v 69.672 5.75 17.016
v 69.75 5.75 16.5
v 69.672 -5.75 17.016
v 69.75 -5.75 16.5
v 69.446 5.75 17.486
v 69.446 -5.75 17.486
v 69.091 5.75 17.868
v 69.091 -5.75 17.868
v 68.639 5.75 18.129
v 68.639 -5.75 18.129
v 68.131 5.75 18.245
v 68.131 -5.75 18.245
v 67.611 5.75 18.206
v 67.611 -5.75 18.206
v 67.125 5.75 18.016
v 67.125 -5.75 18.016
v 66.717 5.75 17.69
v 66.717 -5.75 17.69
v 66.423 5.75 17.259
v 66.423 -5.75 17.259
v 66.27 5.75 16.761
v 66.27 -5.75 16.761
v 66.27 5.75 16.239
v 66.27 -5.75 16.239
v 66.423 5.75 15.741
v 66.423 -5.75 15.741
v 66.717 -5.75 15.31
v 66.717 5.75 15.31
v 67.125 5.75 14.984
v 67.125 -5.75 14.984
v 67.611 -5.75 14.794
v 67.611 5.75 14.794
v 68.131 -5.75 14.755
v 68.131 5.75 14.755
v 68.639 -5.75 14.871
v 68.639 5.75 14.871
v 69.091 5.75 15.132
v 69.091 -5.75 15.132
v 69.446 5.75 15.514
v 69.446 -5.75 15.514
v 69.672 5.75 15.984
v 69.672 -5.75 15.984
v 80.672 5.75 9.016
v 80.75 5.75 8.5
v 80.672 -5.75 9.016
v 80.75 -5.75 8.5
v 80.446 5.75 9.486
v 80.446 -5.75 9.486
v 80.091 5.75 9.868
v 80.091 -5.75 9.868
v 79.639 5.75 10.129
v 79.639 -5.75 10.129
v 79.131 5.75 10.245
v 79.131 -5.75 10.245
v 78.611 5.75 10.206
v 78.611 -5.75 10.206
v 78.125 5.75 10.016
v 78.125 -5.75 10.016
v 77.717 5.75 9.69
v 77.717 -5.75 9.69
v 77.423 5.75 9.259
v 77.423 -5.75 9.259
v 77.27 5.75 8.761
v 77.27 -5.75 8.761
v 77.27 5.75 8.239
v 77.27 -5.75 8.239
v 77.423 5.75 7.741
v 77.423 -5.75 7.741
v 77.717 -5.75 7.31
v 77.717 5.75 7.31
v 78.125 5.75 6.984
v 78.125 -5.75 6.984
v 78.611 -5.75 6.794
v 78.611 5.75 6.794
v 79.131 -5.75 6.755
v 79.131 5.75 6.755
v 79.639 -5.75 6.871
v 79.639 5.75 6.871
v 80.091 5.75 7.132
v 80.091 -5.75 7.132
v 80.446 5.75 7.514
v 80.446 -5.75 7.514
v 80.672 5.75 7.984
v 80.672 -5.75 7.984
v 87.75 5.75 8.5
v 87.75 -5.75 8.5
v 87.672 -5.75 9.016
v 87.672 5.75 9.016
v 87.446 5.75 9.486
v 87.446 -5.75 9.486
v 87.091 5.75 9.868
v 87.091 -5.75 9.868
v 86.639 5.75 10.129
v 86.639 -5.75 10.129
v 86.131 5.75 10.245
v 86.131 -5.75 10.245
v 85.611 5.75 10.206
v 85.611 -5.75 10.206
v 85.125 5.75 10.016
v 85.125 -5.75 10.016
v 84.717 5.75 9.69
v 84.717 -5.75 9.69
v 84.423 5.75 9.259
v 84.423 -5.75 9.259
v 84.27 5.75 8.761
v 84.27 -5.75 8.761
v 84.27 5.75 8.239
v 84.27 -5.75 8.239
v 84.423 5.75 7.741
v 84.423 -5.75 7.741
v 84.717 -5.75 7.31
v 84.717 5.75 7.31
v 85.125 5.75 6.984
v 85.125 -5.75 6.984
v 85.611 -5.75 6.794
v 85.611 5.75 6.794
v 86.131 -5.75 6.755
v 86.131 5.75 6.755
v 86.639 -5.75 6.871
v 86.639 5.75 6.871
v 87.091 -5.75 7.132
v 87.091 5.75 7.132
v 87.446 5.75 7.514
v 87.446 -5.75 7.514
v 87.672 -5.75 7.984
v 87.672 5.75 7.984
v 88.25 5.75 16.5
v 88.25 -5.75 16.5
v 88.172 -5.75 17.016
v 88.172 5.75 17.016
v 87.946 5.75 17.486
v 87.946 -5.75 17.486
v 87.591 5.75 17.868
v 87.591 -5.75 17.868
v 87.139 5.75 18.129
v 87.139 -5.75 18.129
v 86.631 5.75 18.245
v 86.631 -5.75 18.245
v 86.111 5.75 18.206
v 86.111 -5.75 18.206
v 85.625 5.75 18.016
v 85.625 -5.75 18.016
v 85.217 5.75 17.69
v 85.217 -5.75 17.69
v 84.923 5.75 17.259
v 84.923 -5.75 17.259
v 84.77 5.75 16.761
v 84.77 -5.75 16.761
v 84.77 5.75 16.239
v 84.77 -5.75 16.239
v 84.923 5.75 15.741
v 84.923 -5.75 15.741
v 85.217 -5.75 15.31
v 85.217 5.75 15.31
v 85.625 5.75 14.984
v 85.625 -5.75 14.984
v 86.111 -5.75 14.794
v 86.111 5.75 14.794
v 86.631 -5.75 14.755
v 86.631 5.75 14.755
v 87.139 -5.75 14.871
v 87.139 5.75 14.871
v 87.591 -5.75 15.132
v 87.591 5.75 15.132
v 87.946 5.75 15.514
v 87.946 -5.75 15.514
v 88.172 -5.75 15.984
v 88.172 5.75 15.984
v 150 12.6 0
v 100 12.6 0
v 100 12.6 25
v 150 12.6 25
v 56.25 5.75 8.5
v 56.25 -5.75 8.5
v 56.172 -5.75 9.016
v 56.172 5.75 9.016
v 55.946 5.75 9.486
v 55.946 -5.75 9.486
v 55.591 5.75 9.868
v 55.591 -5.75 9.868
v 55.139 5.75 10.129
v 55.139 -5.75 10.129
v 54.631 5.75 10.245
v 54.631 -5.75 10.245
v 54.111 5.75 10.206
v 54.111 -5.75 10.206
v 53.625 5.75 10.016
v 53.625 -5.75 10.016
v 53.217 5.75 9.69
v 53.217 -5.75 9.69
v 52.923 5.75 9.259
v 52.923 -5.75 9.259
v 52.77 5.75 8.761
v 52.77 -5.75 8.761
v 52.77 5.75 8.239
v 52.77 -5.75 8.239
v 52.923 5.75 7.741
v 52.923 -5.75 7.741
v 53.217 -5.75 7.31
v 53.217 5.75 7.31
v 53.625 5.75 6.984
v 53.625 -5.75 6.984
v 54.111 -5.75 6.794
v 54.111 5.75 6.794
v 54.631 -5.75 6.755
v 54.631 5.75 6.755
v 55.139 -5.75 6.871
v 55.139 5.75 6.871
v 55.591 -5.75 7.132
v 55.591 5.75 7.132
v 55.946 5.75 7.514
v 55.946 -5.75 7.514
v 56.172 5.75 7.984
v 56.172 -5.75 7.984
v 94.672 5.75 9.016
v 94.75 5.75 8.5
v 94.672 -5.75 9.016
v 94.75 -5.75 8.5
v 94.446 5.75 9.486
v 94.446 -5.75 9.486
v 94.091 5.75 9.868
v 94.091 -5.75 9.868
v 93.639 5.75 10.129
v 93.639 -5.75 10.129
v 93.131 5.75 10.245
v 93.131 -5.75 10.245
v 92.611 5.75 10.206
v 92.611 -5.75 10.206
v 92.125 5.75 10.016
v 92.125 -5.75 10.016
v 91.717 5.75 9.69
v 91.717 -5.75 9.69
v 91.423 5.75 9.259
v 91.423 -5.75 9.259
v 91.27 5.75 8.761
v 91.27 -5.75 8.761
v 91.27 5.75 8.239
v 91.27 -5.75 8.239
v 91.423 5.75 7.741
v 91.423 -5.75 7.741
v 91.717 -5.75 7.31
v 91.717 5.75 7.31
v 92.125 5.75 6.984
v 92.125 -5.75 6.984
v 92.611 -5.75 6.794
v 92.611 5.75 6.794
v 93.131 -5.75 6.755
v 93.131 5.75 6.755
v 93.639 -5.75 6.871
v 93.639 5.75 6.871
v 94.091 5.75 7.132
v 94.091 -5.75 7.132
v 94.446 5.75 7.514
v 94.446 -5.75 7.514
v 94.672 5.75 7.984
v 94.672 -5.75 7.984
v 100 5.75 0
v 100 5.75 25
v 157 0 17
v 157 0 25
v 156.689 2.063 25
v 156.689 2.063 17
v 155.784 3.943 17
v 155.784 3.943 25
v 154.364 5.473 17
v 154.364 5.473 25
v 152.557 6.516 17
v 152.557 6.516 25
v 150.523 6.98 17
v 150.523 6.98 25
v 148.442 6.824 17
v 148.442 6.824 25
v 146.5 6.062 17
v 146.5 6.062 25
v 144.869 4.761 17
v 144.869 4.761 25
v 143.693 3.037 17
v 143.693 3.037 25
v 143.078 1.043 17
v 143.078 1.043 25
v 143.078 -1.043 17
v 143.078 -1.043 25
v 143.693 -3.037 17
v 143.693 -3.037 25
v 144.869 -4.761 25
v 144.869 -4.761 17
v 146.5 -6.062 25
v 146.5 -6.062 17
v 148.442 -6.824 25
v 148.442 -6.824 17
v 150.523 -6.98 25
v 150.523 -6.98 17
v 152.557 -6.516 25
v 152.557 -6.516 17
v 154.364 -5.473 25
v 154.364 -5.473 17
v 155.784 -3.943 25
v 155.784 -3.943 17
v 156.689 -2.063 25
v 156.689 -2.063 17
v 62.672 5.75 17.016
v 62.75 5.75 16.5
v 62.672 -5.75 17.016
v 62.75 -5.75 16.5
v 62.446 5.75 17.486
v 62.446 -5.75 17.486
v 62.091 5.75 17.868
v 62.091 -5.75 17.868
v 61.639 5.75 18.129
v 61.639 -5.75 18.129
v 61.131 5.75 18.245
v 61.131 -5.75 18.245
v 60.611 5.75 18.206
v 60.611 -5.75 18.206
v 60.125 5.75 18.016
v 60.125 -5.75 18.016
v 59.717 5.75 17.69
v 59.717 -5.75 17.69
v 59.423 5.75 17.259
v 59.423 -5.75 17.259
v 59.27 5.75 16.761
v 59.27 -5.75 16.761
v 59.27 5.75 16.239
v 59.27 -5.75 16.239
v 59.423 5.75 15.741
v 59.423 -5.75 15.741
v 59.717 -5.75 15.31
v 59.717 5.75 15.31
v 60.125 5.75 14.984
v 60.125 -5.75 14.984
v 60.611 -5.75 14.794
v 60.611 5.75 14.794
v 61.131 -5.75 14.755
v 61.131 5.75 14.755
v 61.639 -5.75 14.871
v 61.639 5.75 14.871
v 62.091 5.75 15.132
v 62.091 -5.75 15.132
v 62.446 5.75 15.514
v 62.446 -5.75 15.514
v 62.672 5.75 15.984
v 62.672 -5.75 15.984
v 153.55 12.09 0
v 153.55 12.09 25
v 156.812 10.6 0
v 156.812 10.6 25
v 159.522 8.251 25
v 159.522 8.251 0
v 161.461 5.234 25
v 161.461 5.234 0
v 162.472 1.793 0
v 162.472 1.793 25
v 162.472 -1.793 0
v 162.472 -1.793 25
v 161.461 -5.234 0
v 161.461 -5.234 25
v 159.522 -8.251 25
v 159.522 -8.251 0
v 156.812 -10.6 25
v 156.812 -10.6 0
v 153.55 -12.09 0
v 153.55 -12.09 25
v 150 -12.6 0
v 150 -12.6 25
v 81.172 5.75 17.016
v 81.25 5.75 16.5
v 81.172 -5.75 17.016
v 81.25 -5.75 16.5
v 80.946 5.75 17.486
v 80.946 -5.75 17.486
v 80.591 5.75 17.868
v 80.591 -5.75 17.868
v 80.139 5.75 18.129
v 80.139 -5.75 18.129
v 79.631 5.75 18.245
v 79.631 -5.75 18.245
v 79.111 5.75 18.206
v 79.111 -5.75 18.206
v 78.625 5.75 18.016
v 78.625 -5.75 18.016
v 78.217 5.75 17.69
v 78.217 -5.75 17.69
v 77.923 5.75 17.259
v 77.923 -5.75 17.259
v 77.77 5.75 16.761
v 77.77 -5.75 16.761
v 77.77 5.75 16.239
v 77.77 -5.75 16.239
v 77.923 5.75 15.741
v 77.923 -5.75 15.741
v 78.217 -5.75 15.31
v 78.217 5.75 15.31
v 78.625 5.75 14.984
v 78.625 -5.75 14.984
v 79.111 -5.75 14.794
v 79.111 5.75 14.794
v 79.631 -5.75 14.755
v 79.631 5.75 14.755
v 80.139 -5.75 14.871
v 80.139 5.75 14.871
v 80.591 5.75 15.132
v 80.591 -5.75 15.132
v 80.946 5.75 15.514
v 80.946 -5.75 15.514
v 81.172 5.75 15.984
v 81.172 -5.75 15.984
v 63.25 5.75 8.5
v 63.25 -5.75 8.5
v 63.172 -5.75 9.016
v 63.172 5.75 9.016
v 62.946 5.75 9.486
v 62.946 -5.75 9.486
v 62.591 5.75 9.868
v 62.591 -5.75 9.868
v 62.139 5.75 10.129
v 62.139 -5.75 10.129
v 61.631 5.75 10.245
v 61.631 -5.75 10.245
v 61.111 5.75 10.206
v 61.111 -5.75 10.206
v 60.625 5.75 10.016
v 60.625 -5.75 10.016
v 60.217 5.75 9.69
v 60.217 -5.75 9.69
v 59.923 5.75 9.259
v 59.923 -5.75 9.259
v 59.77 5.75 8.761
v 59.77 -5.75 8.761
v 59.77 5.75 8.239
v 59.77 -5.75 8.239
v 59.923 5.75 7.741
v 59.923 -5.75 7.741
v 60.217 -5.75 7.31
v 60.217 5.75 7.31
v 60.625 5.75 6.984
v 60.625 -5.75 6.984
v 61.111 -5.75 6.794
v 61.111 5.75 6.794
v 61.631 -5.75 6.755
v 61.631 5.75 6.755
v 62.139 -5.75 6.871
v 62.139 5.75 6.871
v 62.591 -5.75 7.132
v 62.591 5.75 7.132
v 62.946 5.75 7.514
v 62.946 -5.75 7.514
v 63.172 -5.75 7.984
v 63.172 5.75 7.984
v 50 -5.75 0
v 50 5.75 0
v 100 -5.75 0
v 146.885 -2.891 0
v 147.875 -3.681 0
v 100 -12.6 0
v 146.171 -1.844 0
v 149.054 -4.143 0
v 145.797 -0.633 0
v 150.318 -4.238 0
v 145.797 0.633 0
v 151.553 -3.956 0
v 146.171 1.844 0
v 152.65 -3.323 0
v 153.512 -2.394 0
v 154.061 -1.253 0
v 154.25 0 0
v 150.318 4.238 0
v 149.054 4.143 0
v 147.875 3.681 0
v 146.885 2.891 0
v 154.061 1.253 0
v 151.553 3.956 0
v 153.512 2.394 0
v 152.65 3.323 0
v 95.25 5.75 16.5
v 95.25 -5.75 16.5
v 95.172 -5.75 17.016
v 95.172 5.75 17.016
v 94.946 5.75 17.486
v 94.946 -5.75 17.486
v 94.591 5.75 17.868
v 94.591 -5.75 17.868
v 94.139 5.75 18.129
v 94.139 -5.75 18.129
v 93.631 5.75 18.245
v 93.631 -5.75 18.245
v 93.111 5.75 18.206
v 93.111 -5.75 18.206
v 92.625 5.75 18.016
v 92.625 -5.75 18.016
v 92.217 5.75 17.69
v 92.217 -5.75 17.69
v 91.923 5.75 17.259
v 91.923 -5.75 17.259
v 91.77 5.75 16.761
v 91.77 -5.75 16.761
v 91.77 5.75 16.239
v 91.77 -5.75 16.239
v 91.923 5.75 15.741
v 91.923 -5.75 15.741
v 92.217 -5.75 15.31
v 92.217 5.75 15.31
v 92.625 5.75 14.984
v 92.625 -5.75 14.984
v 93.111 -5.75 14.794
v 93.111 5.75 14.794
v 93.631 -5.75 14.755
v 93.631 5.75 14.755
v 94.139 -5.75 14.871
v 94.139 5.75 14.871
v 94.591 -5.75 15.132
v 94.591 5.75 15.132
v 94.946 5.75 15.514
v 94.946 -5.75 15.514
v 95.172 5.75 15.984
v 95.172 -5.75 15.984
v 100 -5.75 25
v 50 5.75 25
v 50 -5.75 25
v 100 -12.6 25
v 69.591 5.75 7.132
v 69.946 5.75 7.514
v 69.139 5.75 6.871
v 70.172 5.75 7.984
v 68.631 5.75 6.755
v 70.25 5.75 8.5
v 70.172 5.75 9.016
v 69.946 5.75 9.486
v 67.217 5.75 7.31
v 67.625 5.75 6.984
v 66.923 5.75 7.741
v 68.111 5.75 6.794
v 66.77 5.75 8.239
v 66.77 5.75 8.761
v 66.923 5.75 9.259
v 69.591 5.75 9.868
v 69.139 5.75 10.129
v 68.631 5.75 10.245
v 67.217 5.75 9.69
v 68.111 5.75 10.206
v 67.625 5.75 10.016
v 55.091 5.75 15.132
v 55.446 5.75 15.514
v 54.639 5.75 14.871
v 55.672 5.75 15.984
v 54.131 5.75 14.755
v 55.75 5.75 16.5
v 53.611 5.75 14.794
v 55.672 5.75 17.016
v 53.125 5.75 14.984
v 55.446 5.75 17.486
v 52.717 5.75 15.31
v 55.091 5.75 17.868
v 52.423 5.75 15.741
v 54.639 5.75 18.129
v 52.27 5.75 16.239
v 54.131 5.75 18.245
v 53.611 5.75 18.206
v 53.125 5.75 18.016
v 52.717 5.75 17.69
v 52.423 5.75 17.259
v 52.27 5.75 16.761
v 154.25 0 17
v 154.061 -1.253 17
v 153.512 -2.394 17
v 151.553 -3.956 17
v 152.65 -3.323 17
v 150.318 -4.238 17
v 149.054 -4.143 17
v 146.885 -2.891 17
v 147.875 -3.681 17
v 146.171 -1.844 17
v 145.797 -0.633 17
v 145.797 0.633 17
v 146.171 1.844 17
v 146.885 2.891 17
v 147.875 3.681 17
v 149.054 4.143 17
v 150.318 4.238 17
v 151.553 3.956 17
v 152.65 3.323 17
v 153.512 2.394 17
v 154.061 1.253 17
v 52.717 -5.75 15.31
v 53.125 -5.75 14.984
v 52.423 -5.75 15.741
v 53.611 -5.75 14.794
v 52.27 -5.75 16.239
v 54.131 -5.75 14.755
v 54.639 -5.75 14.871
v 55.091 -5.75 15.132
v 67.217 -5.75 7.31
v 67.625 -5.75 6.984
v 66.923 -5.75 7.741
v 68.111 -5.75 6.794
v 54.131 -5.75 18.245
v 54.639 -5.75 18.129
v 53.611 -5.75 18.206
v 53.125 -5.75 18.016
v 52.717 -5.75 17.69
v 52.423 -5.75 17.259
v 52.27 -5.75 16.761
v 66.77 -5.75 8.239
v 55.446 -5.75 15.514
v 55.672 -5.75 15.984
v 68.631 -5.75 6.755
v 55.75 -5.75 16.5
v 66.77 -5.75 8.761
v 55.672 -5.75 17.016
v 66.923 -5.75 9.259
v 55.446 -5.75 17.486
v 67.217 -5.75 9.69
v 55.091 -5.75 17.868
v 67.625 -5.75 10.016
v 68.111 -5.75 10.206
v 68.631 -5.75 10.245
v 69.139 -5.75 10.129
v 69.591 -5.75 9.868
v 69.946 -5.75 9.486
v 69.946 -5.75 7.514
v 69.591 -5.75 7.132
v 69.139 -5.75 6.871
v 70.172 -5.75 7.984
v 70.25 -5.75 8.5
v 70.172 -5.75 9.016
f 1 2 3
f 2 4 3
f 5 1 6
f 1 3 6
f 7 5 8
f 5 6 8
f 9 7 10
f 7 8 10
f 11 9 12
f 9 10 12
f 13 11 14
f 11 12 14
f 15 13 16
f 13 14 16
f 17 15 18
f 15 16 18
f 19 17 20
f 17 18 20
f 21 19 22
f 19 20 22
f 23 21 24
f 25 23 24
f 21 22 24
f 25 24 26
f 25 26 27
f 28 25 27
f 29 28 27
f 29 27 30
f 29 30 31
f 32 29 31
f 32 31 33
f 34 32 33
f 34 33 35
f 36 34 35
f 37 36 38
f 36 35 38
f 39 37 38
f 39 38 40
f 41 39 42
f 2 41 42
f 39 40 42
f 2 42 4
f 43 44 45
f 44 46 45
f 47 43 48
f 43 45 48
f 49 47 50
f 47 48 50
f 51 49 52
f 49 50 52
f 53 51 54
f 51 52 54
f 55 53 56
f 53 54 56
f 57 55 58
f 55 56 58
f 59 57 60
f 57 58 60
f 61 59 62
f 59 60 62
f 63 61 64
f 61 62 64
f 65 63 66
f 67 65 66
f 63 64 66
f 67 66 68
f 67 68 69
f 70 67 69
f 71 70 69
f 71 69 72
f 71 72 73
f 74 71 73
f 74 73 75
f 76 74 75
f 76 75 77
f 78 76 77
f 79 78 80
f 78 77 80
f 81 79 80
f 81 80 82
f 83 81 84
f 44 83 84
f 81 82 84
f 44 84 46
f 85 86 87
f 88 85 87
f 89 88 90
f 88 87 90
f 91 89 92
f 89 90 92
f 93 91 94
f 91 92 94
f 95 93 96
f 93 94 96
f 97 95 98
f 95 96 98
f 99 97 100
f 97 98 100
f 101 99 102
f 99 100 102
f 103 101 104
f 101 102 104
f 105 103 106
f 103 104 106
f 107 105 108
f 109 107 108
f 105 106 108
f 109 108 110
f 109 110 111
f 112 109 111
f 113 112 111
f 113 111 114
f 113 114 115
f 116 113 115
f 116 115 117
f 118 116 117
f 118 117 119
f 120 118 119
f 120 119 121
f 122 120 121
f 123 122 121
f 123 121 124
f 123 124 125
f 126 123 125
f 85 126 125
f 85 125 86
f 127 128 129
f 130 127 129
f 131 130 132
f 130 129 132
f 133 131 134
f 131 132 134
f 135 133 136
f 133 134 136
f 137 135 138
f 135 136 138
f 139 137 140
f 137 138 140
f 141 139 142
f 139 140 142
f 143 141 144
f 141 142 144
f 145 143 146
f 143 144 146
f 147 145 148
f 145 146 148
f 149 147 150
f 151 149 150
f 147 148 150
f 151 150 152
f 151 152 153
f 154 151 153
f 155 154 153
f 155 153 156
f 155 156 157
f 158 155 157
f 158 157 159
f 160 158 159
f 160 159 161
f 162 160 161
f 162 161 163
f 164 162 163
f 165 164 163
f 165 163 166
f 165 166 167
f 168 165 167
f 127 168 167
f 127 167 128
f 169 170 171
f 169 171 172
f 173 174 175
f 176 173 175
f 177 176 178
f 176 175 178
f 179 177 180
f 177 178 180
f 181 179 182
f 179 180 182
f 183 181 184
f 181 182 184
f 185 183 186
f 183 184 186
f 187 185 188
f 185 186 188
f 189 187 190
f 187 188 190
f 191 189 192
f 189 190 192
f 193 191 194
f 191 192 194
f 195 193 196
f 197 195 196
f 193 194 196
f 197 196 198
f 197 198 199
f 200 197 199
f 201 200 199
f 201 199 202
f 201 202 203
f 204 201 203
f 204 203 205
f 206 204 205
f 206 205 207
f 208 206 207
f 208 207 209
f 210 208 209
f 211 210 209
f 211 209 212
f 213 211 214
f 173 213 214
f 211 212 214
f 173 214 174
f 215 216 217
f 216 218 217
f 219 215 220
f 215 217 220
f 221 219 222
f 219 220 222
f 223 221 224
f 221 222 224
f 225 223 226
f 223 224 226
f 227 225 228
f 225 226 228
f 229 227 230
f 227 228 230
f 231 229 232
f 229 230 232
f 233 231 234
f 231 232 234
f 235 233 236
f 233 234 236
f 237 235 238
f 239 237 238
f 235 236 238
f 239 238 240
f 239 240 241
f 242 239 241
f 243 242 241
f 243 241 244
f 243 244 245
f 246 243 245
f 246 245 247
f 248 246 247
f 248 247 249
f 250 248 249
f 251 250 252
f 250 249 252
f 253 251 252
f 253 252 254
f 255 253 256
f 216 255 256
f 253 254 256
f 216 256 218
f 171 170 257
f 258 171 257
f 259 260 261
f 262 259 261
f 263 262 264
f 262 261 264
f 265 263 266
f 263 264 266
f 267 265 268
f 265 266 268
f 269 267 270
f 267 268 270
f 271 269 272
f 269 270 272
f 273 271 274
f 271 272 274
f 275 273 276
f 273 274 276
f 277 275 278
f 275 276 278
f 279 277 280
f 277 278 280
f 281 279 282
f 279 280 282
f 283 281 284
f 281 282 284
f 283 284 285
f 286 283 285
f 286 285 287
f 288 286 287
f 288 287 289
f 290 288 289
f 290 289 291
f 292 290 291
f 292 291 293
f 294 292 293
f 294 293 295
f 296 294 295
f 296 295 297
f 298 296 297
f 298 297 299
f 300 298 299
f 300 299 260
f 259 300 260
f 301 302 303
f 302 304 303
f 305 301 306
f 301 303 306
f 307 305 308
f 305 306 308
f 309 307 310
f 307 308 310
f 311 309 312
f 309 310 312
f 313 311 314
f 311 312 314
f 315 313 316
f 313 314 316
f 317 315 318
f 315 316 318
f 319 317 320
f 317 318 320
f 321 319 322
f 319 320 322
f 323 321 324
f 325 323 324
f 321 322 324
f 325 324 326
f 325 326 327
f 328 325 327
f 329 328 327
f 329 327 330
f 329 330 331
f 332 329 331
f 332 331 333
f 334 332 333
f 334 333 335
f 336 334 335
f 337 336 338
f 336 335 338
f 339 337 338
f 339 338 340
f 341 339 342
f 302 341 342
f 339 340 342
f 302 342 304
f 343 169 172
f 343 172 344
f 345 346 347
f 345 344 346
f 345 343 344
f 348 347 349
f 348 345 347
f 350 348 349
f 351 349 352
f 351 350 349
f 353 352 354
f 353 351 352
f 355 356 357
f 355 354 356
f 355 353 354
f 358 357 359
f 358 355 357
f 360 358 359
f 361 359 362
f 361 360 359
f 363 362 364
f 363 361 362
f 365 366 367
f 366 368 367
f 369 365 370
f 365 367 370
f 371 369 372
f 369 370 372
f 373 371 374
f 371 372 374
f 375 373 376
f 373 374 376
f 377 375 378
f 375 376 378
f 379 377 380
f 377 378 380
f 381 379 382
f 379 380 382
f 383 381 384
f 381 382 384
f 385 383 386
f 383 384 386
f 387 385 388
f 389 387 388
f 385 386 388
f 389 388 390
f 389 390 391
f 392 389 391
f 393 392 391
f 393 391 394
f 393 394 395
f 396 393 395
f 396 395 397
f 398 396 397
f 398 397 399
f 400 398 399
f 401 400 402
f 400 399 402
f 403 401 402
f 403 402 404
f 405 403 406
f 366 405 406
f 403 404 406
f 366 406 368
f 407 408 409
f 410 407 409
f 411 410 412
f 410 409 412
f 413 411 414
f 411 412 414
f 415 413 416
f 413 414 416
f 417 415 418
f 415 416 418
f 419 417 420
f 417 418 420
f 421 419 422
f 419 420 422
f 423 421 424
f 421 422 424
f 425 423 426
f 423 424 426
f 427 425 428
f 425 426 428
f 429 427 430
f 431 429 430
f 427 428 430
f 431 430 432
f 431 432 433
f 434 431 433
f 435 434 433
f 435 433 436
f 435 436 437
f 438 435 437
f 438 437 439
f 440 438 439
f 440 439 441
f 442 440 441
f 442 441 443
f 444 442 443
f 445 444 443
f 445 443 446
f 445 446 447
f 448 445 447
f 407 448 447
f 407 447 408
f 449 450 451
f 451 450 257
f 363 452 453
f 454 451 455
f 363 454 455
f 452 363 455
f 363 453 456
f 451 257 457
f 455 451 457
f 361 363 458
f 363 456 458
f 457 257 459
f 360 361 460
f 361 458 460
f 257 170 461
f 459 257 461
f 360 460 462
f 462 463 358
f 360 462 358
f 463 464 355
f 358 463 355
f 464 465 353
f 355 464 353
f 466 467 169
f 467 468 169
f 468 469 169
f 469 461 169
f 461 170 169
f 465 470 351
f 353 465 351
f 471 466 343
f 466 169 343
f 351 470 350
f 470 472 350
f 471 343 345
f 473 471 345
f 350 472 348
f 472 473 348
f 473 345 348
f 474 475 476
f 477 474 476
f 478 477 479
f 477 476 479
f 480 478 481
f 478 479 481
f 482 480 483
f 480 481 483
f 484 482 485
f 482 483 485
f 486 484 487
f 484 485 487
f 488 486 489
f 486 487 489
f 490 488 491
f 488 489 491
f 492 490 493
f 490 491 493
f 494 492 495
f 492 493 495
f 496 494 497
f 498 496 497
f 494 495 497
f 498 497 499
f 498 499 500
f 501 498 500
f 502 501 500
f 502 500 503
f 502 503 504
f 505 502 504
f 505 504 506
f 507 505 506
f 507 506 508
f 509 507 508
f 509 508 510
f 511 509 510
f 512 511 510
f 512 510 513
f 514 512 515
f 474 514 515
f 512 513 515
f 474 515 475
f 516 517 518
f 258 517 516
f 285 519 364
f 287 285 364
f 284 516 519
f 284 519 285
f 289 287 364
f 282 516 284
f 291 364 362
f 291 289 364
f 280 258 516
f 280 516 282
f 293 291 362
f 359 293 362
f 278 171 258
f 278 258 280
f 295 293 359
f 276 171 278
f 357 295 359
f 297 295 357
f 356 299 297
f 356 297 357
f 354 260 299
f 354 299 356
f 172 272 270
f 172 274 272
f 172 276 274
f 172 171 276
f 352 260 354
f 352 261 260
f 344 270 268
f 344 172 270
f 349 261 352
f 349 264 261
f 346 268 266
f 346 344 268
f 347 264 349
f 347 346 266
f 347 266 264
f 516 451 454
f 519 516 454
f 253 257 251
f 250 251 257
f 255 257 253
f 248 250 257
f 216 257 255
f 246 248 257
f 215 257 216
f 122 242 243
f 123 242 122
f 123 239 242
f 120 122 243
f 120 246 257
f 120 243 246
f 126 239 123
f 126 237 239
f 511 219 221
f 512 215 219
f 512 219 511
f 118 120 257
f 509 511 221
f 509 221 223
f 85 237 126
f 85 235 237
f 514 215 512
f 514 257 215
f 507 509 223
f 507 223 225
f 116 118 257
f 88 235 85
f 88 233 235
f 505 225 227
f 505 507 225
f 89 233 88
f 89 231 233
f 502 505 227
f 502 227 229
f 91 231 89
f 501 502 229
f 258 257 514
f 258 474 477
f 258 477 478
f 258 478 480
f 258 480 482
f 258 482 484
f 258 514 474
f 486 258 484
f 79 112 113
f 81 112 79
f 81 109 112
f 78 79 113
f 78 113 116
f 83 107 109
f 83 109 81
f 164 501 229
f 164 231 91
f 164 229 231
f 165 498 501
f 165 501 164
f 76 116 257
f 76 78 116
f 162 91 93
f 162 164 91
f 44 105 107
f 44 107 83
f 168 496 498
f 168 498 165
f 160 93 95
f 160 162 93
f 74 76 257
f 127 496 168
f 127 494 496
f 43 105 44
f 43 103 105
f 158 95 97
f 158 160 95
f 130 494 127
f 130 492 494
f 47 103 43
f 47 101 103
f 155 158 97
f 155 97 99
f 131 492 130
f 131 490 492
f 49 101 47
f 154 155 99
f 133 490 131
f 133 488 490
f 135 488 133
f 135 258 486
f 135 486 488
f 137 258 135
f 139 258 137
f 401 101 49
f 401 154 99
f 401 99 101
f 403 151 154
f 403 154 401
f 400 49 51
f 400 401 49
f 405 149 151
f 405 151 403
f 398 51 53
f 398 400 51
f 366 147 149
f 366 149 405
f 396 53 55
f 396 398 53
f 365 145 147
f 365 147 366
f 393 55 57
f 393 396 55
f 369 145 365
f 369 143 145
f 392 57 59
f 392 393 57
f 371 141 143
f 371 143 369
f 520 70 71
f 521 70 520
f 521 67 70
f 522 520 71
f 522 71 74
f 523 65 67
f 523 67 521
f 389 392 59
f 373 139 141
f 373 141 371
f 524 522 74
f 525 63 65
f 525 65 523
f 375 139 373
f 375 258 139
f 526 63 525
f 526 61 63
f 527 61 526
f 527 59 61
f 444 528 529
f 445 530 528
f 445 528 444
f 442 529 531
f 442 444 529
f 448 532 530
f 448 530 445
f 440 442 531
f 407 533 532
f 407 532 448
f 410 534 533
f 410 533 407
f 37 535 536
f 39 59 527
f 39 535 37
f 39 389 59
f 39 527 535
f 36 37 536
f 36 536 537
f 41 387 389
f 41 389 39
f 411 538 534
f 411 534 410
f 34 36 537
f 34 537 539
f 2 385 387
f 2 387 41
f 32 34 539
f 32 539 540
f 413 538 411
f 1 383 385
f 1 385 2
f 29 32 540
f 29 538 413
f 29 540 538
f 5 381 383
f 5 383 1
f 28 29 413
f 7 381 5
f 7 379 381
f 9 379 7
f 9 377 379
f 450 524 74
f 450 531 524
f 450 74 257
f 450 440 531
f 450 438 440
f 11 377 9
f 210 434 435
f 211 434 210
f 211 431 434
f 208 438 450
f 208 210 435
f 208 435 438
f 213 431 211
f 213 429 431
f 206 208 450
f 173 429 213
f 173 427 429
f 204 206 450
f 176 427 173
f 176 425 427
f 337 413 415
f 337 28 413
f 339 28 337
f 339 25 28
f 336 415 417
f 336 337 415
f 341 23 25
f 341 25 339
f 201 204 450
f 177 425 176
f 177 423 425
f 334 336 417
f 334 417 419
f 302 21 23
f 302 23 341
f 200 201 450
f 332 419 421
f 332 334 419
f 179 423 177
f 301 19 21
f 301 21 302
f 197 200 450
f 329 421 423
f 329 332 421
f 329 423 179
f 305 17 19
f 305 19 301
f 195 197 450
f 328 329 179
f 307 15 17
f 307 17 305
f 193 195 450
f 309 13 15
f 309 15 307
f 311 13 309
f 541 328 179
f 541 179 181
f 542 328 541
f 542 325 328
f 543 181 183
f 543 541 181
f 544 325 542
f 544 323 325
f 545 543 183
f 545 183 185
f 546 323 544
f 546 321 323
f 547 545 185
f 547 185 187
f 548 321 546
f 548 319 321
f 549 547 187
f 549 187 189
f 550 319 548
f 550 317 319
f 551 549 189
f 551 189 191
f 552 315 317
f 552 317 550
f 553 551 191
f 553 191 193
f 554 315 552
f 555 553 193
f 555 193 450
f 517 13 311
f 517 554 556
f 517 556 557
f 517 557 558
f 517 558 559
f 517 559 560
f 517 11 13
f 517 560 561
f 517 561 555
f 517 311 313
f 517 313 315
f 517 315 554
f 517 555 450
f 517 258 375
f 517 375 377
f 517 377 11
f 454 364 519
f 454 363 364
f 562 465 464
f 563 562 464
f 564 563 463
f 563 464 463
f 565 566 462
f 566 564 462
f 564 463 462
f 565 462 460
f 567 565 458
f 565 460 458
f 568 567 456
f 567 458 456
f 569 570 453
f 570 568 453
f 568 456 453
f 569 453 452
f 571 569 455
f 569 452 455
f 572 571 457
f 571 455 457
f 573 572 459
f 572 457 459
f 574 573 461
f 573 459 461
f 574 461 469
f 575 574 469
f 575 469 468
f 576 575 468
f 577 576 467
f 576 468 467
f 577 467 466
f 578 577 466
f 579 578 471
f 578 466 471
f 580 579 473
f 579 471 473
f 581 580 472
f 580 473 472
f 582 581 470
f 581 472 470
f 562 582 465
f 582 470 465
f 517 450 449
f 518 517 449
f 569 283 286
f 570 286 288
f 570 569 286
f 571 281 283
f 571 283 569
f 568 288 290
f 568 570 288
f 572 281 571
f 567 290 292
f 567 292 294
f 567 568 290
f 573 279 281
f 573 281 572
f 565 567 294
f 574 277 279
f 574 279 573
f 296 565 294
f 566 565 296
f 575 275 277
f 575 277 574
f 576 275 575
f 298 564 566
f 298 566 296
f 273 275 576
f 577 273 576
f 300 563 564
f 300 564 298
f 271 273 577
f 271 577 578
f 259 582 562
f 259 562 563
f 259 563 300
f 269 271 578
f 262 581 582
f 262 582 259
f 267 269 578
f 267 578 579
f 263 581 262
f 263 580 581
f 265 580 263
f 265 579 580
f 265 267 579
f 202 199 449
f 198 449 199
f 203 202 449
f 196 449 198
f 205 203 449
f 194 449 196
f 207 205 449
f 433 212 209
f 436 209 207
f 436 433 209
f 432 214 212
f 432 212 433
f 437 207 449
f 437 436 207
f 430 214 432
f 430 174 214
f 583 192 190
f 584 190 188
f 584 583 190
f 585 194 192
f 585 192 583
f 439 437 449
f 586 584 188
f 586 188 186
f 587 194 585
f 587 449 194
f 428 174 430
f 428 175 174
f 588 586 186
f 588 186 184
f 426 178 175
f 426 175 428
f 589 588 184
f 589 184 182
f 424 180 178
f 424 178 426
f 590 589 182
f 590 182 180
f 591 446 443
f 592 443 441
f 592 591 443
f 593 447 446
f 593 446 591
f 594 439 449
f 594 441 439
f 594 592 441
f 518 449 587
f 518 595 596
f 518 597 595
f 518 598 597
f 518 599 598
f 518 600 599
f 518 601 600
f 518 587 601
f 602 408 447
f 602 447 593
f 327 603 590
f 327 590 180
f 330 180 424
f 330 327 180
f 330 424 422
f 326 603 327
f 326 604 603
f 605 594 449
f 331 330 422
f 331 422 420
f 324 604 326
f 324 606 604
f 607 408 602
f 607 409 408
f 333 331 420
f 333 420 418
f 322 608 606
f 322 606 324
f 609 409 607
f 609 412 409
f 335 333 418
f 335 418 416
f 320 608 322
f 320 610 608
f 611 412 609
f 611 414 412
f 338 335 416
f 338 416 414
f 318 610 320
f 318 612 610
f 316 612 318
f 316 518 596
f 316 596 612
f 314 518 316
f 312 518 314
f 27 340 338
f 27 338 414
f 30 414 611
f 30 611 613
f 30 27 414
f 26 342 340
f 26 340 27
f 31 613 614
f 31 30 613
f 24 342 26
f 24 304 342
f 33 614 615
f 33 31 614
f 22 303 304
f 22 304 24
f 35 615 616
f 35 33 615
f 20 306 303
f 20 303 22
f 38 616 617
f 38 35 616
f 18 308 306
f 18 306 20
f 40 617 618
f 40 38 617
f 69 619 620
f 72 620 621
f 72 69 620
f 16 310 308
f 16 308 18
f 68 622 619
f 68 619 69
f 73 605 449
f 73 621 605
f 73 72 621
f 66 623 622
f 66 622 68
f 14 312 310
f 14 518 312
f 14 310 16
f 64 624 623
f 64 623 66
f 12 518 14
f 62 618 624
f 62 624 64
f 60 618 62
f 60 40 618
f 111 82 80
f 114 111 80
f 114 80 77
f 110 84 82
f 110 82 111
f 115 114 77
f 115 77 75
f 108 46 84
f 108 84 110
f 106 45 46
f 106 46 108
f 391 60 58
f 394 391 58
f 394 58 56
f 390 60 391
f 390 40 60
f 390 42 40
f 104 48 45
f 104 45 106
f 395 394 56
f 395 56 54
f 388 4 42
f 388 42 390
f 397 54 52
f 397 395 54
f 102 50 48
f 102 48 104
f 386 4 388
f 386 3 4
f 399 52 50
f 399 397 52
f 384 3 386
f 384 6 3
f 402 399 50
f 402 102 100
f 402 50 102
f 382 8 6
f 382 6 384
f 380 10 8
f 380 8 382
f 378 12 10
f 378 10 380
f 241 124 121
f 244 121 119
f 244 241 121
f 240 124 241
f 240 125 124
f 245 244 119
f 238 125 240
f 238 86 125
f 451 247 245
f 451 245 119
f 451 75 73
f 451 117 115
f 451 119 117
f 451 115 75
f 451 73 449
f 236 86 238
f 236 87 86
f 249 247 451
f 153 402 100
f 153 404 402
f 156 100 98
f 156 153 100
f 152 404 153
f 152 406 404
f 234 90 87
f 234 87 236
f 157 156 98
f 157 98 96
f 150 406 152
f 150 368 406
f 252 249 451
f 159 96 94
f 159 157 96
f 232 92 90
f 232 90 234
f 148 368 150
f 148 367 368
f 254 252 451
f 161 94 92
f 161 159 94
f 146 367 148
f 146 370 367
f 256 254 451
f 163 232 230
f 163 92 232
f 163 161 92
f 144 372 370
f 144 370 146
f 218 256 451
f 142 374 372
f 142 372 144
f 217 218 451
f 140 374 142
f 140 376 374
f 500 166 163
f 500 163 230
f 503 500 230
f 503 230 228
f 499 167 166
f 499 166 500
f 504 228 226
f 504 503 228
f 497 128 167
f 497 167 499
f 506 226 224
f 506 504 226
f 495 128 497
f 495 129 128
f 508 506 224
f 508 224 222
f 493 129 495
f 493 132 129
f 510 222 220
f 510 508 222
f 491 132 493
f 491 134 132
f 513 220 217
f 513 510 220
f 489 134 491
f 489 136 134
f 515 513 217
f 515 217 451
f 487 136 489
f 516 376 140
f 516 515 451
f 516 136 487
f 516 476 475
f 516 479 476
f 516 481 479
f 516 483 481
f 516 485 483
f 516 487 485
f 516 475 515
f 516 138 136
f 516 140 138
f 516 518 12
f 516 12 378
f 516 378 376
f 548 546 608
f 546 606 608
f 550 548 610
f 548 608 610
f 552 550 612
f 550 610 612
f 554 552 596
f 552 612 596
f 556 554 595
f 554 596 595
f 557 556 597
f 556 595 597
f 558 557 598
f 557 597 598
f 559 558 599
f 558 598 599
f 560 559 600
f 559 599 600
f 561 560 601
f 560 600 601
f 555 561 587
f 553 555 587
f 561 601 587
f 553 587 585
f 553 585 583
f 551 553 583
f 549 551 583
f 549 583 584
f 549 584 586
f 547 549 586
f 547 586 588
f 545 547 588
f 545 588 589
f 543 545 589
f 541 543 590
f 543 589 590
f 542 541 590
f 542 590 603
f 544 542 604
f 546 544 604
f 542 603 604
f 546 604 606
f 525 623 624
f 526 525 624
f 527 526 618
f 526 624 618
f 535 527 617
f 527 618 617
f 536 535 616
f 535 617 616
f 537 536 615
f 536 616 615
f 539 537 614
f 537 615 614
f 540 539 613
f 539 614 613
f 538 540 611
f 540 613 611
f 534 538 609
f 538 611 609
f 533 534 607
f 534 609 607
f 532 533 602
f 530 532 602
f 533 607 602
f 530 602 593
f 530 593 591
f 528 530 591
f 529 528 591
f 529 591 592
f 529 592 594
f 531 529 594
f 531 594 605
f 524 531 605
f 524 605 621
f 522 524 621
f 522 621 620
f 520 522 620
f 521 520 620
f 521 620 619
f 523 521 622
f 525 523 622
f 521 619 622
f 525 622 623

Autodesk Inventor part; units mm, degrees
ref_plane "YZ Plane" through (0, 0, 0) normal (1, 0, 0) x (0, 1, 0)
ref_plane "XZ Plane" through (0, 0, 0) normal (0, 1, 0) x (-1, 0, 0)
ref_plane "XY Plane" through (0, 0, 0) normal (0, 0, 1) x (1, 0, 0)
sketch "Sketch1" plane through (0, 0, 0) normal (0, 0, 1) x (1, 0, 0)
  line L0 (0, 12.6) -> (150, 12.6)
  arc A0 (150, -12.6) -> (150, 12.6) centre (150, 0) ccw
  line L1 (150, -12.6) -> (0, -12.6)
  arc A1 (0, 12.6) -> (0, -12.6) centre (0, 0) ccw
  circle A2 centre (0, 0) radius 7.5
  circle A3 centre (150, 0) radius 4.25
  dimension "d0" = 150
  dimension "d2" = 12.6
  dimension "d3" = 15
  dimension "d4" = 8.5
extrude "Extrusion1" add sketch "Sketch1" along normal blind 25
sketch "Sketch2" plane through (0, 0, 25) normal (0, 0, 1) x (1, 0, 0)
  circle A0 centre (0, 0) radius 7.5 projected
  arc A1 (0, 12.6) -> (0, -12.6) centre (0, 0) ccw projected
  circle A2 centre (0, 0) radius 11
  dimension "d7" = 22
extrude "Extrusion2" cut sketch "Sketch2" against normal blind 7
sketch "Sketch4" plane through (0, 0, 25) normal (0, 0, 1) x (1, 0, 0)
  circle A0 centre (0, 0) radius 11 projected
  circle A1 centre (20, 0) radius 1.75
  circle A2 centre (40, 0) radius 1.75
  dimension "d16" = 20
  dimension "d17" = 40
  dimension "d23" = 3.5
extrude "Extrusion3" cut sketch "Sketch4" against normal through all contours A1 | A2
sketch "Sketch5" plane through (0, 0, 25) normal (0, 0, 1) x (1, 0, 0)
  circle A0 centre (20, 0) radius 1.75 projected
  circle A1 centre (40, 0) radius 1.75 projected
  circle A2 centre (40, 0) radius 3
  circle A3 centre (20, 0) radius 3
  dimension "d28" = 6
extrude "Extrusion4" cut sketch "Sketch5" against normal blind 3
sketch "Sketch6" plane through (0, 0, 25) normal (0, 0, 1) x (1, 0, 0)
  line L0 (150, 12.6) -> (0, 12.6) projected
  arc A0 (0, 12.6) -> (0, -12.6) centre (0, 0) ccw projected
  line L1 (0, -12.6) -> (150, -12.6) projected
  arc A1 (12.1445, 12.6) -> (12.1445, -12.6) centre (0, 0) ccw
  dimension "d24" = 35
extrude "Extrusion5" add sketch "Sketch6" against normal up to surface (25 mm away)
sketch "Sketch7" plane through (0, 0, 25) normal (0, 0, 1) x (1, 0, 0)
  circle A0 centre (150, 0) radius 4.25 projected
  arc A1 (150, -12.6) -> (150, 12.6) centre (150, 0) ccw projected
  circle A2 centre (150, 0) radius 7
  dimension "d30" = 14
extrude "Extrusion6" cut sketch "Sketch7" against normal blind 8
fillet "Fillet1" radius 3.5 1 edges at (-7.5, 0, 18)
sketch "Sketch8" plane through (0, 0, 25) normal (0, 0, 1) x (1, 0, 0)
  circle A0 centre (150, 0) radius 7 projected
  line L0 (150, 12.6) -> (12.1445, 12.6) projected
  arc A1 (12.1445, 12.6) -> (12.1445, -12.6) centre (0, 0) ccw projected
  line L1 (12.1445, -12.6) -> (150, -12.6) projected
  line L2 (100, 12.6) -> (100, 5.75)
  line L3 (100, 5.75) -> (50, 5.75)
  line L4 (50, 5.75) -> (50, -5.75)
  line L5 (50, -5.75) -> (100, -5.75)
  line L6 (100, -5.75) -> (100, -12.6)
  dimension "d35" = 50
  dimension "d36" = 50
  dimension "d37" = 11.5
extrude "Extrusion7" cut sketch "Sketch8" against normal through all contours L2 L3 L4 L5 L6 L1 A1 L0
sketch "Sketch9" plane through (50, -5.75, 25) normal (0, -1, 0) x (1, 0, 0)
  line L0 (0, 0) -> (0, -25) projected
  line L1 (4.5, -8.5) -> (12.5, -8.5) construction
  line L2 (12.5, -8.5) -> (12.5, -16.5) construction
  line L3 (12.5, -16.5) -> (4.5, -16.5) construction
  line L4 (4.5, -16.5) -> (4.5, -8.5) construction
  line L5 (12.5, -16.5) -> (20.5, -16.5) construction
  line L6 (20.5, -16.5) -> (20.5, -8.5) construction
  line L7 (20.5, -8.5) -> (12.5, -8.5) construction
  line L8 (12.5, -8.5) -> (12.5, -16.5) construction
  circle A0 centre (4.5, -16.5) radius 1.75
  circle A1 centre (4, -8.5) radius 1.75
  circle A2 centre (11.5, -16.5) radius 1.75
  circle A3 centre (11, -8.5) radius 1.75
  circle A4 centre (18.5, -16.5) radius 1.75
  circle A5 centre (18, -8.5) radius 1.75
  line L9 (29.5, -8.5) -> (37.5, -8.5) construction
  line L10 (37.5, -8.5) -> (37.5, -16.5) construction
  line L11 (37.5, -16.5) -> (29.5, -16.5) construction
  line L12 (29.5, -16.5) -> (29.5, -8.5) construction
  line L13 (37.5, -16.5) -> (45.5, -16.5) construction
  line L14 (45.5, -16.5) -> (45.5, -8.5) construction
  line L15 (45.5, -8.5) -> (37.5, -8.5) construction
  line L16 (37.5, -8.5) -> (37.5, -16.5) construction
  circle A6 centre (29.5, -8.5) radius 1.75
  circle A7 centre (29, -16.5) radius 1.75
  circle A8 centre (36.5, -8.5) radius 1.75
  circle A9 centre (36, -16.5) radius 1.75
  circle A10 centre (43.5, -8.5) radius 1.75
  circle A11 centre (43, -16.5) radius 1.75
  point P0 (-50, -25)
  point P1 (0, -12.5)
  point P2 (12.5, -12.5)
  point P3 (12.5, -12.5)
  point P4 (37.5, -12.5)
  dimension "d40" = 12.5
  dimension "d41" = 8
  dimension "d42" = 0.5
  dimension "d43" = 1
  dimension "d44" = 1.5
  dimension "d45" = 2
  dimension "d46" = 2.5
  dimension "d47" = 3.5
  dimension "d48" = 25
  dimension "d49" = 0.5
  dimension "d50" = 1
  dimension "d51" = 1.5
  dimension "d52" = 2
  dimension "d53" = 2.5
extrude "Extrusion8" cut sketch "Sketch9" against normal through all
properties part number "driven arm2_2"
